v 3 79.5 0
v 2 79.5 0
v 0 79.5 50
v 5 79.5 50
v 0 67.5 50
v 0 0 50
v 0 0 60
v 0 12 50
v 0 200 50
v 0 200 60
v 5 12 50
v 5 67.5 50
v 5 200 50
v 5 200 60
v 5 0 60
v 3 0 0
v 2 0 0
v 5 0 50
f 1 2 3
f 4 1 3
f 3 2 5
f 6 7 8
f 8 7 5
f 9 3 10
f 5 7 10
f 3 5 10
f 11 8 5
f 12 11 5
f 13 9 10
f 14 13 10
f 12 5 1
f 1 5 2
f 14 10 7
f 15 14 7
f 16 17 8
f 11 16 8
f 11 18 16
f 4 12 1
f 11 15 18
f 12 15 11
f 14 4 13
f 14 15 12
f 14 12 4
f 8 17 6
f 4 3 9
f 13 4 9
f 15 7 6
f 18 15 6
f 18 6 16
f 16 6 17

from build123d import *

# Parameters (mm, degrees)
F1_DEPTH = 5
F3_DEPTH = 200.001


# Not quite as in the source:
# - a feature names something its author has since deleted; it is built from what else it names


with BuildPart() as f1:
    # F0 (on Right) → F1 (new body)
    with BuildSketch(Plane.YZ):
        Polygon((200, 60), (0, 60), (0, 0), (12, 50), (67.5, 50), (79.5, 0), (79.5, 50), (200, 50), align=None)
    extrude(amount=F1_DEPTH)

    # F2 (on face) → F3 (cut, through all)
    with BuildSketch(Plane.XZ):
        Polygon((2, 0), (0, 50), (0, 0), align=None)
        Polygon((5, 0), (5, 50), (3, 0), align=None)
    extrude(amount=-F3_DEPTH, mode=Mode.SUBTRACT)


solid = f1.part
